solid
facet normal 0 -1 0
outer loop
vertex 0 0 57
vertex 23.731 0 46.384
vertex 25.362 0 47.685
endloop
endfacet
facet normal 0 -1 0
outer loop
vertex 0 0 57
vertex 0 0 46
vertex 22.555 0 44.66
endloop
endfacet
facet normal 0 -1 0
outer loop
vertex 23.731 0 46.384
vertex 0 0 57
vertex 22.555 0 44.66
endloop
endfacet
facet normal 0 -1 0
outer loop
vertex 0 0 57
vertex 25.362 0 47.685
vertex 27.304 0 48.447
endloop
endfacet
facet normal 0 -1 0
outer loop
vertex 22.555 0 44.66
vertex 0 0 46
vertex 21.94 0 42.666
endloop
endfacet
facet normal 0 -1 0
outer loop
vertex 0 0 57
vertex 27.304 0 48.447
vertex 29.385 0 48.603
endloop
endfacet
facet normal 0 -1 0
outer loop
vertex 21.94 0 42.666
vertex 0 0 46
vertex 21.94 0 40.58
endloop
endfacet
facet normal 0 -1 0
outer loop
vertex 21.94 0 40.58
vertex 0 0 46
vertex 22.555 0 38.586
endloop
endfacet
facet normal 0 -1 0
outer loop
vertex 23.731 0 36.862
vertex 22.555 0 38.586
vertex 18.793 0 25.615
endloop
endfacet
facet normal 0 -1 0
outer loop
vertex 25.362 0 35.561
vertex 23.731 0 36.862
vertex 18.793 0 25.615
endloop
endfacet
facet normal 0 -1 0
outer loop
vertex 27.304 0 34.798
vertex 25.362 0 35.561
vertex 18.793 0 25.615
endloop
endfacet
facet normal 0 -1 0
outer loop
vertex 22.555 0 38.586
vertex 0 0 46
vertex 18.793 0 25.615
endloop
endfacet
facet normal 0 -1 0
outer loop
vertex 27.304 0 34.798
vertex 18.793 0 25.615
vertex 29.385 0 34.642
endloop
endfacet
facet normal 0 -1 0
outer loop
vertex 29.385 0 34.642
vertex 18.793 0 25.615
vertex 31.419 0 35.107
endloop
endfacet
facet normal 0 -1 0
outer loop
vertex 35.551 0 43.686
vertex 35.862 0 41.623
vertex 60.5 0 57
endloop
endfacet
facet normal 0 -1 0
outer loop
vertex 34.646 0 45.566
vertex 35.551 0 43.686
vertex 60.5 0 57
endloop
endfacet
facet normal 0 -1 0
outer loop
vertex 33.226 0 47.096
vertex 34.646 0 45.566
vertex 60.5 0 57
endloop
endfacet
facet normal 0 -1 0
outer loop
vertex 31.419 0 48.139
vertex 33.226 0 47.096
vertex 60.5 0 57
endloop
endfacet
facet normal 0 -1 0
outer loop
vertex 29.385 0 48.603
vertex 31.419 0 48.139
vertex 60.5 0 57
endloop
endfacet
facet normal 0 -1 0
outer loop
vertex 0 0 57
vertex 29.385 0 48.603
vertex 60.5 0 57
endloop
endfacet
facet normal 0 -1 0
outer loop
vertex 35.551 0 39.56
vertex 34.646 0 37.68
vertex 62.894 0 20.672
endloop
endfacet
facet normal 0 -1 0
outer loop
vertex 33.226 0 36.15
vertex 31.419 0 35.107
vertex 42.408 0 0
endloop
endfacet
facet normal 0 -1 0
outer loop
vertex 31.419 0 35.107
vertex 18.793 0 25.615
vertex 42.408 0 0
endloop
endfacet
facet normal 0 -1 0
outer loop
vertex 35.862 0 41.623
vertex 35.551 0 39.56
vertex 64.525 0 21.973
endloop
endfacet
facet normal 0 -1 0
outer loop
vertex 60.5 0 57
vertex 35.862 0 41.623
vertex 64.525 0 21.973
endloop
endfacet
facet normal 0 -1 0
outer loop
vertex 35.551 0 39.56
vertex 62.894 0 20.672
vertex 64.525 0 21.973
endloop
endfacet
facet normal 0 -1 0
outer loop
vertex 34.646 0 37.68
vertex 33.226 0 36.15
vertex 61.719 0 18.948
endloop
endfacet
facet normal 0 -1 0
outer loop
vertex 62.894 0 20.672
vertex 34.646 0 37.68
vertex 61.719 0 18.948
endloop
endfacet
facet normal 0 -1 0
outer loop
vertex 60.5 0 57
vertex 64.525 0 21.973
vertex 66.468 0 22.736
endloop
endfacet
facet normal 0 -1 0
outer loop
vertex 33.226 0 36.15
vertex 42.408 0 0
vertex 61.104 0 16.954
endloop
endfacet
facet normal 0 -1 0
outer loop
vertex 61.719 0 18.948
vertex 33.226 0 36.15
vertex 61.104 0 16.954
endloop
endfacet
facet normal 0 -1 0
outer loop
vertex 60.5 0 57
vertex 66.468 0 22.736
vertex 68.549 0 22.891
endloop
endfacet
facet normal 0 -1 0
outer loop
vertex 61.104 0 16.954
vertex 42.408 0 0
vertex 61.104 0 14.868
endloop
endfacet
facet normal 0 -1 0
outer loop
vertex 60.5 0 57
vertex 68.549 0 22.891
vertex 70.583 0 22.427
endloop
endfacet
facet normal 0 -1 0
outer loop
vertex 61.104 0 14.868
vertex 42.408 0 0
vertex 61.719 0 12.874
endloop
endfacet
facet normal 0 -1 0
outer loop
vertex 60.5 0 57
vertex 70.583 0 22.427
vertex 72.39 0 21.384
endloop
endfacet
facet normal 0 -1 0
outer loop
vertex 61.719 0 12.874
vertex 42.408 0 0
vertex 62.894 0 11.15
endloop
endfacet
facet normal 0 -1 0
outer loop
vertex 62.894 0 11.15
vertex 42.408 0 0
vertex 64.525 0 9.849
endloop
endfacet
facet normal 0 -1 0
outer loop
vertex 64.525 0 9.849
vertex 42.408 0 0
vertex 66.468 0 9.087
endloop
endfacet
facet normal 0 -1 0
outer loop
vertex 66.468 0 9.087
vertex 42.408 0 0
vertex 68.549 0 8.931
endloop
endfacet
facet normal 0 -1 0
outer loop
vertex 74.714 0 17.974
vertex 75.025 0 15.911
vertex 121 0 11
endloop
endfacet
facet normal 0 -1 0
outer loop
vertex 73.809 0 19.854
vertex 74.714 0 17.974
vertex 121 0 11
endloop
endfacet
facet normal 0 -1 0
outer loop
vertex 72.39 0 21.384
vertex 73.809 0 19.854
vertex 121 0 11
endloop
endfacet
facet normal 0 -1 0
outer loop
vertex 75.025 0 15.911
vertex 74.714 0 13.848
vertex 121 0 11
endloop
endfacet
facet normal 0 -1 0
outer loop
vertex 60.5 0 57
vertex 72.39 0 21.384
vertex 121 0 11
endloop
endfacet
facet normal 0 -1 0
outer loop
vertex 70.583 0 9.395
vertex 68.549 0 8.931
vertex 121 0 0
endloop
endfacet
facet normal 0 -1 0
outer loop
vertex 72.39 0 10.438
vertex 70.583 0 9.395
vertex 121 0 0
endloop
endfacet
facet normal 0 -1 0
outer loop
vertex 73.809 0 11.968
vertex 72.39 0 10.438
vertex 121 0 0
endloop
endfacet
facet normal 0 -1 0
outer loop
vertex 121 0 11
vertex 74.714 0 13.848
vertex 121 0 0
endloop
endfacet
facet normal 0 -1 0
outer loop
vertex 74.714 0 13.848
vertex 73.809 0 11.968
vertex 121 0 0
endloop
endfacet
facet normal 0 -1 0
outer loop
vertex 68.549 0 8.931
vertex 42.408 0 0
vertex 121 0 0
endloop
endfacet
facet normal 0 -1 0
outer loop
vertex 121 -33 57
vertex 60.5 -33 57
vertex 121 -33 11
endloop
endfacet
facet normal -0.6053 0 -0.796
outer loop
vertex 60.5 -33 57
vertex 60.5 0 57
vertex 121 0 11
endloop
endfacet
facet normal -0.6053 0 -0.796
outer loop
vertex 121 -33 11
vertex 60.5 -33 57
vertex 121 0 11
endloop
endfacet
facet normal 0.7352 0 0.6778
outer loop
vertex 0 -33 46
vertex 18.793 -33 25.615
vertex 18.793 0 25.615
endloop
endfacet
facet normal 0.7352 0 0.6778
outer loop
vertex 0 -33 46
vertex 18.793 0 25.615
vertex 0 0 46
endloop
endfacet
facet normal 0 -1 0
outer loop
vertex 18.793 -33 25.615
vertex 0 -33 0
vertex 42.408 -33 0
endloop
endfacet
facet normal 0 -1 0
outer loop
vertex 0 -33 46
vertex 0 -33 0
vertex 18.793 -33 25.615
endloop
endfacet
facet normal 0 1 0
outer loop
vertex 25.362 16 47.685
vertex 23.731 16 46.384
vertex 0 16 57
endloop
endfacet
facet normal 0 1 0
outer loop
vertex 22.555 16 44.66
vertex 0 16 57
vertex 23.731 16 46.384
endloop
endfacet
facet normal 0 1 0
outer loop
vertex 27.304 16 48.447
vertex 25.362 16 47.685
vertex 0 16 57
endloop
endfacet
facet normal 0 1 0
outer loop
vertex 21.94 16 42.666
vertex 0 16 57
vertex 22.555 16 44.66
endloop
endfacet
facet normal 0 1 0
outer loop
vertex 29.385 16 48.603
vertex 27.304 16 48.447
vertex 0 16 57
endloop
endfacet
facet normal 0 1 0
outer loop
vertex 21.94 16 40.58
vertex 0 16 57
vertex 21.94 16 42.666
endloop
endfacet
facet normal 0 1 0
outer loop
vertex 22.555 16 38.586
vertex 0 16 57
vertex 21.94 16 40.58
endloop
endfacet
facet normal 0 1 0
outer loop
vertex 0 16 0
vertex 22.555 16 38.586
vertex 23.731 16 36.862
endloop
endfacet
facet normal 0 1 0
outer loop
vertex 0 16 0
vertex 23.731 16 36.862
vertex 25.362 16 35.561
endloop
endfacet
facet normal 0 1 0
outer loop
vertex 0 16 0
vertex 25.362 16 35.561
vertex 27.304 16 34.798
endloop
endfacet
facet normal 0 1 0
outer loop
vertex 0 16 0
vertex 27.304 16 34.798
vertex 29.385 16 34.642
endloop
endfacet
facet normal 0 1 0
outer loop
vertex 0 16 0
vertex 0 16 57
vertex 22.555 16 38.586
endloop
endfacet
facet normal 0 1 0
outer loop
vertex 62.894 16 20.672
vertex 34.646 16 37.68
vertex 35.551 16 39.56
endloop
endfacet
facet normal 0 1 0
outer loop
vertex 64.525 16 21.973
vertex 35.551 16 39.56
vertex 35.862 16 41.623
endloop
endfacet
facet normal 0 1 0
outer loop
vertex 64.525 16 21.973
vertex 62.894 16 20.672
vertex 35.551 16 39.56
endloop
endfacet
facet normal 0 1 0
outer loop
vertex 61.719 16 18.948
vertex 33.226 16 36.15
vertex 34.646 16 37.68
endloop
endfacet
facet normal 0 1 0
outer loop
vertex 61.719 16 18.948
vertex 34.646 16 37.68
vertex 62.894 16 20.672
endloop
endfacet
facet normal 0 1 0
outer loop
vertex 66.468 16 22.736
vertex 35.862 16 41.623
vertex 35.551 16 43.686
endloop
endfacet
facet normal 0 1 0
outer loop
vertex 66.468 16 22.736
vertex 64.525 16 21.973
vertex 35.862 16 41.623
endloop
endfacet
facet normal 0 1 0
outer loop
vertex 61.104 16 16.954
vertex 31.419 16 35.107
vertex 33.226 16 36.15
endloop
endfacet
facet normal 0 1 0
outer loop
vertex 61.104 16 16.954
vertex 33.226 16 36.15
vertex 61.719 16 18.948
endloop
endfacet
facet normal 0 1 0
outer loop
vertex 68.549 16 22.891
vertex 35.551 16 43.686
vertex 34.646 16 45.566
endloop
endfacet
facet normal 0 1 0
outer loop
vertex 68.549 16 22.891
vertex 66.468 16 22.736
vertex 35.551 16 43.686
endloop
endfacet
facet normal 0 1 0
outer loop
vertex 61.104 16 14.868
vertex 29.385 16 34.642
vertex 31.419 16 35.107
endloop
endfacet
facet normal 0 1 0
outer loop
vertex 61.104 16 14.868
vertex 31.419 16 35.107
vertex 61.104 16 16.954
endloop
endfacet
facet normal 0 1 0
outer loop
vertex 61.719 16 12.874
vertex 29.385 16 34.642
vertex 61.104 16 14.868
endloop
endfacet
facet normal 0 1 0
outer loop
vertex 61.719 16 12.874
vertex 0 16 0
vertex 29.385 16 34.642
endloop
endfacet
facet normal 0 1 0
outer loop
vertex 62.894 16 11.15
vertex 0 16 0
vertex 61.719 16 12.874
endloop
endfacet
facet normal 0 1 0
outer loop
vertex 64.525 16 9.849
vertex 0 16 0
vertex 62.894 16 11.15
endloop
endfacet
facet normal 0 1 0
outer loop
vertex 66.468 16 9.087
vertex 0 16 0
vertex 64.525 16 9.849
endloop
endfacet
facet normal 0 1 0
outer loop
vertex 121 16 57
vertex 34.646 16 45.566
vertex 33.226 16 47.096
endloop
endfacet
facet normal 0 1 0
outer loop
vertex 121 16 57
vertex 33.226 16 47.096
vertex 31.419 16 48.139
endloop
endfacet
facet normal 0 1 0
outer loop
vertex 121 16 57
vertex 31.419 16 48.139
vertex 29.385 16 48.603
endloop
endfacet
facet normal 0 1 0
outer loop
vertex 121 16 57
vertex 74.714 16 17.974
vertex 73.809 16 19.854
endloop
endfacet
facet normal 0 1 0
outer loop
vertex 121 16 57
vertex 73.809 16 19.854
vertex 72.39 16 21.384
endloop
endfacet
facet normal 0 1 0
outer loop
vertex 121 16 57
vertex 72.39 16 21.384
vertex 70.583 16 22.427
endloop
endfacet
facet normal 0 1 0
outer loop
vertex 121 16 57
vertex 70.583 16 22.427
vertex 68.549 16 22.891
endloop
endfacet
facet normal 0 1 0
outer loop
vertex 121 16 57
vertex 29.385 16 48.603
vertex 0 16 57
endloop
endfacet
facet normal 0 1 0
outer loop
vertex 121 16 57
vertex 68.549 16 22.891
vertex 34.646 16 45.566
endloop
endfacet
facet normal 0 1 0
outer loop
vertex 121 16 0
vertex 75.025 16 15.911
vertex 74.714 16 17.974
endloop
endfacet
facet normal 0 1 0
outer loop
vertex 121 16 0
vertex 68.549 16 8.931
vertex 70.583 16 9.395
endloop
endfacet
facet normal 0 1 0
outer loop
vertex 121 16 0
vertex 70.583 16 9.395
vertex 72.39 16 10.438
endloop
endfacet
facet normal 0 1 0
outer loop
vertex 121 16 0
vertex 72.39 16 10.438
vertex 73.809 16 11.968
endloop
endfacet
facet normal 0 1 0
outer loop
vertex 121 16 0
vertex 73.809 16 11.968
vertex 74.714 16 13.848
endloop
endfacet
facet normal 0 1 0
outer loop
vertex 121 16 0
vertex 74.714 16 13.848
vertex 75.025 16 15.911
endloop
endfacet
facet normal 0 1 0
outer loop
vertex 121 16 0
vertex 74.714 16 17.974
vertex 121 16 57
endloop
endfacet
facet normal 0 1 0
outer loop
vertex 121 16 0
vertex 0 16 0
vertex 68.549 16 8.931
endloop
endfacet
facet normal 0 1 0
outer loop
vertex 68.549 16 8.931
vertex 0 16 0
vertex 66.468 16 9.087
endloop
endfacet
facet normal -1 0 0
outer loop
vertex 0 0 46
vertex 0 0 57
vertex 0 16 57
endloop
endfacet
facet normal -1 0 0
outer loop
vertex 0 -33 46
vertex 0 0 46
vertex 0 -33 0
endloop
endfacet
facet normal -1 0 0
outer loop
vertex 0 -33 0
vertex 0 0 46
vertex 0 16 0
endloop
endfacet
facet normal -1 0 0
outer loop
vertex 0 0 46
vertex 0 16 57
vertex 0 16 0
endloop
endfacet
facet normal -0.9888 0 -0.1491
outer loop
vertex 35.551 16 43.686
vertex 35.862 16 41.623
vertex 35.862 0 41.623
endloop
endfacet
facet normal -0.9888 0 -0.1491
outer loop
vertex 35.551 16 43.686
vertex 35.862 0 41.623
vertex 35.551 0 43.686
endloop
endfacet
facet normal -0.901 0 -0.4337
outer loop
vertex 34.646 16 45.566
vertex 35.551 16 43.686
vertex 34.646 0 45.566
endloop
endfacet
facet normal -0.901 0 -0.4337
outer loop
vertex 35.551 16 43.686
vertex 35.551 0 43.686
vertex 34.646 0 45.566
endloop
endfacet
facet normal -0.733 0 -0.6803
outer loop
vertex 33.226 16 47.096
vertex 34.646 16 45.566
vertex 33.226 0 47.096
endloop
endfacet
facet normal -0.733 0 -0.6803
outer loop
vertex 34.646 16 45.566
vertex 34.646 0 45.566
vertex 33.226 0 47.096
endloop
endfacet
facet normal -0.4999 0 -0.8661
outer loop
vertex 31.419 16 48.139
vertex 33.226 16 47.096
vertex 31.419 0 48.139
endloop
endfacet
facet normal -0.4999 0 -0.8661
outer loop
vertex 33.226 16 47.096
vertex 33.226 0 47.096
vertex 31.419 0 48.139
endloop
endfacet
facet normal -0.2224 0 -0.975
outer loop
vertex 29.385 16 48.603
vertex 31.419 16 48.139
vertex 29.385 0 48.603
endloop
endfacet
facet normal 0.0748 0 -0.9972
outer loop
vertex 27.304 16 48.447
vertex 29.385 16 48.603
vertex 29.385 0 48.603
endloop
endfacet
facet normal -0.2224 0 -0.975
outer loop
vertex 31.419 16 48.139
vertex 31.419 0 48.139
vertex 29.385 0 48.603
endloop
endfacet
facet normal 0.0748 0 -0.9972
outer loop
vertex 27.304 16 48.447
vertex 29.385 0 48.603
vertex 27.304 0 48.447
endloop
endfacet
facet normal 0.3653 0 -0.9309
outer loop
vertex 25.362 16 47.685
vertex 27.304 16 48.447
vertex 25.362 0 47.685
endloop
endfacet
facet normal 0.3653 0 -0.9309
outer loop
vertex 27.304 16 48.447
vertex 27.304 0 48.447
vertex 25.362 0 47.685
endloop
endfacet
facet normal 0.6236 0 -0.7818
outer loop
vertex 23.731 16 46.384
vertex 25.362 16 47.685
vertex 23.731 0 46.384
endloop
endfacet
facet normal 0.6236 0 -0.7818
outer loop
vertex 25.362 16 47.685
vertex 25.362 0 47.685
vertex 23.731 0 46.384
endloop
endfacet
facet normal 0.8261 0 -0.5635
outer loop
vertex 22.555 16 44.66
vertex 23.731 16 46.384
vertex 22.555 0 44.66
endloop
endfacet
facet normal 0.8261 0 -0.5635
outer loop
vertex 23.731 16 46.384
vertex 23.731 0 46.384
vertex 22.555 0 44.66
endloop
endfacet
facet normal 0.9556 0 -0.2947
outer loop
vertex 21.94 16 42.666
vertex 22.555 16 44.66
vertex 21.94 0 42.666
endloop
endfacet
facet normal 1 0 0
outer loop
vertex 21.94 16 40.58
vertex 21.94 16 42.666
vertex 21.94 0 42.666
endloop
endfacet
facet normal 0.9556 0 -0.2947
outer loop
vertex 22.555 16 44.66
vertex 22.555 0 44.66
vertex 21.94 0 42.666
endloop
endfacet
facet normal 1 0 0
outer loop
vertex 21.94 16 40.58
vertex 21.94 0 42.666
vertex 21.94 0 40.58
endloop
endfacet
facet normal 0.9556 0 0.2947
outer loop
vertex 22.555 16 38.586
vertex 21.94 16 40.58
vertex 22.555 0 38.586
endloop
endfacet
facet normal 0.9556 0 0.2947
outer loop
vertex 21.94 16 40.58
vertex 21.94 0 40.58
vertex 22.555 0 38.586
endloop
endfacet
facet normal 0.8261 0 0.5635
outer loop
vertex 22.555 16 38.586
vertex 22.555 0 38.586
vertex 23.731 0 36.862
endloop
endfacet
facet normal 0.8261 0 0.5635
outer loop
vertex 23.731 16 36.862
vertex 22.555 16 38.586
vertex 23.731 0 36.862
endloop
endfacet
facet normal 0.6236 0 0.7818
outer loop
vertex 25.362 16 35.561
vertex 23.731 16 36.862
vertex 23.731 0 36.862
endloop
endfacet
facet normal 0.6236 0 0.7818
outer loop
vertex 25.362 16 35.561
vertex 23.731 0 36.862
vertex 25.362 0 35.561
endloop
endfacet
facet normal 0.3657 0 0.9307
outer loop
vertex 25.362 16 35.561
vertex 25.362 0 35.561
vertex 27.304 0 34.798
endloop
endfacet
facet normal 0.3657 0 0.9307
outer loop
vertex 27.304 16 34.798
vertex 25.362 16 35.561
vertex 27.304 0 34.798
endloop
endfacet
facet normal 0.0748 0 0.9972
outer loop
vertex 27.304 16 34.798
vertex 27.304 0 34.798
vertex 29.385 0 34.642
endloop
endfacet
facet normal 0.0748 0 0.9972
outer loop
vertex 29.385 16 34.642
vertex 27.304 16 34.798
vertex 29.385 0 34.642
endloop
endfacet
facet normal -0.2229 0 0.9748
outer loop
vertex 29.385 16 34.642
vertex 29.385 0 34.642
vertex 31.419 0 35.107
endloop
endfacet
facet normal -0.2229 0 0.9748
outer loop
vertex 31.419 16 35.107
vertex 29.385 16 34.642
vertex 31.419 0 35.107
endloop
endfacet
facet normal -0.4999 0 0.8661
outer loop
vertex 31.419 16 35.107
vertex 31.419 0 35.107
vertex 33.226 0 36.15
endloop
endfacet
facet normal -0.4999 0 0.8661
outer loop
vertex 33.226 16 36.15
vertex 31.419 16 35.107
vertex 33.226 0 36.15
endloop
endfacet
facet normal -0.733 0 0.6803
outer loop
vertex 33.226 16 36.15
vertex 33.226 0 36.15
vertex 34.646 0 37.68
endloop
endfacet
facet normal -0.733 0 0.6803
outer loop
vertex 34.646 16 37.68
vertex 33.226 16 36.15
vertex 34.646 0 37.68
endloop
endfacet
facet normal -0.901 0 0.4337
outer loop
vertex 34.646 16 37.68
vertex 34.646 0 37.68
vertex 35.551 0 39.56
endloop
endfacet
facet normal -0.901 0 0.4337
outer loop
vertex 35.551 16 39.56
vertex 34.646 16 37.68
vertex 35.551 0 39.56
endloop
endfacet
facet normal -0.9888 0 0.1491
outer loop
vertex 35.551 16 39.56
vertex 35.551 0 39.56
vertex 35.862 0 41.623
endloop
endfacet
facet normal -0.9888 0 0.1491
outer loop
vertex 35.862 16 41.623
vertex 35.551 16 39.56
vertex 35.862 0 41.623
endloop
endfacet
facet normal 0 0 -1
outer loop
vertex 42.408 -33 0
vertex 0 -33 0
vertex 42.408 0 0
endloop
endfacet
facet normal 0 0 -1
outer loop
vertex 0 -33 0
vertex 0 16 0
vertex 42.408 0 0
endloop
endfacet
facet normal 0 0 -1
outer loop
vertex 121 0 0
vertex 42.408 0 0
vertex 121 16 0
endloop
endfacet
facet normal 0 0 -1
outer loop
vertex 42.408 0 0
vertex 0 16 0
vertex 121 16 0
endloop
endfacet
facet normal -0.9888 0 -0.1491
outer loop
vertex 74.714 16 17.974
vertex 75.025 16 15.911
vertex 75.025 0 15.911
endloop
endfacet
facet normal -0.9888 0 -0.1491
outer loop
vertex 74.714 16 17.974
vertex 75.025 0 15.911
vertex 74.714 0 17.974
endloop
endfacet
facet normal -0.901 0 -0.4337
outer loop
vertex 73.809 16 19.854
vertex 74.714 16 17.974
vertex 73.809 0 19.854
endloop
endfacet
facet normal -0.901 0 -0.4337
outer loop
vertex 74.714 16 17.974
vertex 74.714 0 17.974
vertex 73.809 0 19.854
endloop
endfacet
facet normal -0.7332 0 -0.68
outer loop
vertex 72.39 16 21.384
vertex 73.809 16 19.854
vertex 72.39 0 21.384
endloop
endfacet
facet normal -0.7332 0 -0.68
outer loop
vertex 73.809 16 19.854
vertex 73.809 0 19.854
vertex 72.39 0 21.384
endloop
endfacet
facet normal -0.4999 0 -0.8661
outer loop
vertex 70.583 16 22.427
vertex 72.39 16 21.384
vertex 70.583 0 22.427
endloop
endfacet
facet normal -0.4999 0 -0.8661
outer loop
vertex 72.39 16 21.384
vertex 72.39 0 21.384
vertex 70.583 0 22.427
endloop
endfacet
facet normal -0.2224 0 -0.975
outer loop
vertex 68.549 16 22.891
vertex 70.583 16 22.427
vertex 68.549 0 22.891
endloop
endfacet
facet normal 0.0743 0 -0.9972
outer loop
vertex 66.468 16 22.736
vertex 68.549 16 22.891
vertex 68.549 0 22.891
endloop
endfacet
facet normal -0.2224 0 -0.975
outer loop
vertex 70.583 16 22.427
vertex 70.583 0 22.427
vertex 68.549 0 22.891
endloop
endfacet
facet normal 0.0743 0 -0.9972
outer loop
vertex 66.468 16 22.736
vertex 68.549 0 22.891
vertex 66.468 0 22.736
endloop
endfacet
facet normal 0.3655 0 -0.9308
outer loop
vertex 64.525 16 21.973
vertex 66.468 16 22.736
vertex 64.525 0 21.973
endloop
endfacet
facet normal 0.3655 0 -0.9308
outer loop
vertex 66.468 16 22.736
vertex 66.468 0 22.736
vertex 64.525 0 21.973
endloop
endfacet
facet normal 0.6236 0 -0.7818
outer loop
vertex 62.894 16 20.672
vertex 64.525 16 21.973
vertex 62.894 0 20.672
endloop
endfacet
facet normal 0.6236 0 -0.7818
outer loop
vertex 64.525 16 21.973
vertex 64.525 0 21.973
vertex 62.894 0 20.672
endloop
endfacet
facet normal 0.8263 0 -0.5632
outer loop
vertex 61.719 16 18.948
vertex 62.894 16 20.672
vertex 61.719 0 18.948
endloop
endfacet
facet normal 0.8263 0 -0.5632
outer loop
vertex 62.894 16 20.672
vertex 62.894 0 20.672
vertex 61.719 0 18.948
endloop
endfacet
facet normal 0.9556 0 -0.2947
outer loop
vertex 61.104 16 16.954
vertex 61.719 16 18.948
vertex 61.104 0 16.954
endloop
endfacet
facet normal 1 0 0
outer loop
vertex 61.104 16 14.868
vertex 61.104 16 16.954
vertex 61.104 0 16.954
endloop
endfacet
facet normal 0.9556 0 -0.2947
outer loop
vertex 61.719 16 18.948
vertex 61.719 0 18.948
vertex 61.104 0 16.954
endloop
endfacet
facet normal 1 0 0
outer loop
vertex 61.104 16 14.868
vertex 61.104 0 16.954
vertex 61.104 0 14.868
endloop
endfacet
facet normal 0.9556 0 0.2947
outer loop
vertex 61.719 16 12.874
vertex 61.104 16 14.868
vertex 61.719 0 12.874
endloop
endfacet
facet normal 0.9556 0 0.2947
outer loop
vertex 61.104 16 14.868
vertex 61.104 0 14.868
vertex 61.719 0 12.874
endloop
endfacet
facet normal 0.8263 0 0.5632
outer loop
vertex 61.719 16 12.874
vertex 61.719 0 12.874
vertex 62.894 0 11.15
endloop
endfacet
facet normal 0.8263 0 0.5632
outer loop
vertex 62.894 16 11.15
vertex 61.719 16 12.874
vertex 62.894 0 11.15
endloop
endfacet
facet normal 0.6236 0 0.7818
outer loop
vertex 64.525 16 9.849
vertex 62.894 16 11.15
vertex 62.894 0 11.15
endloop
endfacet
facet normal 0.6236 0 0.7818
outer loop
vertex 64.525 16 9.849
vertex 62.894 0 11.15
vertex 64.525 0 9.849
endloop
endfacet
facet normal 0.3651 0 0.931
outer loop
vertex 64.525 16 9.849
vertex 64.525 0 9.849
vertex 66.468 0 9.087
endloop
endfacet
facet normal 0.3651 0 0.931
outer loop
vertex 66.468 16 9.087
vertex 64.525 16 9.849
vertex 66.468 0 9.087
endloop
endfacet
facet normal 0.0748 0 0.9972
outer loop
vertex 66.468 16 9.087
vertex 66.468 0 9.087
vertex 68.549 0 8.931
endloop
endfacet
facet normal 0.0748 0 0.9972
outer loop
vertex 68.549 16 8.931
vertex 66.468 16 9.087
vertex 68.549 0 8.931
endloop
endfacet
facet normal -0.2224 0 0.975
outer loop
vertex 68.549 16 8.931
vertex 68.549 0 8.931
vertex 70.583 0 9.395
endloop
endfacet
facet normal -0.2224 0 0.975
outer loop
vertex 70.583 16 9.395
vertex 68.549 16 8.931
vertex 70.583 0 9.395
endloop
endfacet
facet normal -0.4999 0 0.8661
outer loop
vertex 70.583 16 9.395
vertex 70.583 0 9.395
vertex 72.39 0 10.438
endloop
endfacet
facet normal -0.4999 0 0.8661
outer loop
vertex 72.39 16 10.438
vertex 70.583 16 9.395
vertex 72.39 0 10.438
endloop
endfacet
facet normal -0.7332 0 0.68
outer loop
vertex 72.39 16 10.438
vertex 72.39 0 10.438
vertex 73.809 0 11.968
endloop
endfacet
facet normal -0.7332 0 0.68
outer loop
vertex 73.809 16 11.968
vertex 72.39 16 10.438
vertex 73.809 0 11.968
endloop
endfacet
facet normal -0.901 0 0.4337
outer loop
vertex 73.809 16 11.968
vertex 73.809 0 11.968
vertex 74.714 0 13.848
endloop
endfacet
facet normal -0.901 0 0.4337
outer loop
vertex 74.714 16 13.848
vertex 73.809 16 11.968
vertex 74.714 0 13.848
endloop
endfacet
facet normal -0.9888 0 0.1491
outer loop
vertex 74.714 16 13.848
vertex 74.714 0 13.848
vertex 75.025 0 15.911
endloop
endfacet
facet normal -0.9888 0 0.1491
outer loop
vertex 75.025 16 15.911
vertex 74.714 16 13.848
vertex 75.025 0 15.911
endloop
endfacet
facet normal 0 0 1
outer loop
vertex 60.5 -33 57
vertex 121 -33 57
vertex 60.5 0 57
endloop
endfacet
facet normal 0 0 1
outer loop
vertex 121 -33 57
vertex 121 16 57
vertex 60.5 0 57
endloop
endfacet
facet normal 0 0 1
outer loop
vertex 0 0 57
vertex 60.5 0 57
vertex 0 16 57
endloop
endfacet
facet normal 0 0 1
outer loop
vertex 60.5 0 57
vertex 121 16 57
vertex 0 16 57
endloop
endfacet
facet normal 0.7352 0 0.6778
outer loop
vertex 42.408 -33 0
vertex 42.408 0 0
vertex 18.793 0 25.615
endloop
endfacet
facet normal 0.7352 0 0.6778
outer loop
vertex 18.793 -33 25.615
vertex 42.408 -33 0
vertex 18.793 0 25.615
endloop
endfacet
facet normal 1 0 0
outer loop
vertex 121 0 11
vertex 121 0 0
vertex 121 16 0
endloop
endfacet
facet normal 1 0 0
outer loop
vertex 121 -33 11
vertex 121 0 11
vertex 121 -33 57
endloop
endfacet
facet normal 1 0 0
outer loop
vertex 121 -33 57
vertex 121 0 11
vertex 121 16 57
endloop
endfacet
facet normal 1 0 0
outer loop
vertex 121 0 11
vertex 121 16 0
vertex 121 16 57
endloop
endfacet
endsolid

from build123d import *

# Parameters (mm, degrees)
F0_W     = 121
F0_H     = 16
F1_DEPTH = 57
F3_DEPTH = 33
F5_DEPTH = 33
F6_R     = 7
F7_DEPTH = 16.001


with BuildPart() as f1:
    # F0 (on Top) → F1 (new body)
    with BuildSketch(Plane.XY):
        with Locations((60.5, 8)):
            Rectangle(F0_W, F0_H)
    extrude(amount=F1_DEPTH)

    # F2 (on face) → F3 (join)
    with BuildSketch(Plane.XZ):
        Polygon((18.79299, 25.615024), (0, 46), (0, 0), (18.79299, 0), align=None)
        Polygon((42.407583, 0), (18.79299, 25.615024), (18.79299, 0), align=None)
    extrude(amount=F3_DEPTH)

    # F4 (on face) → F5 (join)
    with BuildSketch(Plane.XZ):
        Polygon((121, 11), (121, 57), (60.5, 57), align=None)
    extrude(amount=F5_DEPTH)

    # F6 (on face) → F7 (cut, through all)
    with BuildSketch(Plane.XZ):
        with Locations((28.861878, 41.622804)):
            Circle(F6_R)
        with Locations((68.02547, 15.911056)):
            Circle(F6_R)
    extrude(amount=-F7_DEPTH, mode=Mode.SUBTRACT)


solid = f1.part
